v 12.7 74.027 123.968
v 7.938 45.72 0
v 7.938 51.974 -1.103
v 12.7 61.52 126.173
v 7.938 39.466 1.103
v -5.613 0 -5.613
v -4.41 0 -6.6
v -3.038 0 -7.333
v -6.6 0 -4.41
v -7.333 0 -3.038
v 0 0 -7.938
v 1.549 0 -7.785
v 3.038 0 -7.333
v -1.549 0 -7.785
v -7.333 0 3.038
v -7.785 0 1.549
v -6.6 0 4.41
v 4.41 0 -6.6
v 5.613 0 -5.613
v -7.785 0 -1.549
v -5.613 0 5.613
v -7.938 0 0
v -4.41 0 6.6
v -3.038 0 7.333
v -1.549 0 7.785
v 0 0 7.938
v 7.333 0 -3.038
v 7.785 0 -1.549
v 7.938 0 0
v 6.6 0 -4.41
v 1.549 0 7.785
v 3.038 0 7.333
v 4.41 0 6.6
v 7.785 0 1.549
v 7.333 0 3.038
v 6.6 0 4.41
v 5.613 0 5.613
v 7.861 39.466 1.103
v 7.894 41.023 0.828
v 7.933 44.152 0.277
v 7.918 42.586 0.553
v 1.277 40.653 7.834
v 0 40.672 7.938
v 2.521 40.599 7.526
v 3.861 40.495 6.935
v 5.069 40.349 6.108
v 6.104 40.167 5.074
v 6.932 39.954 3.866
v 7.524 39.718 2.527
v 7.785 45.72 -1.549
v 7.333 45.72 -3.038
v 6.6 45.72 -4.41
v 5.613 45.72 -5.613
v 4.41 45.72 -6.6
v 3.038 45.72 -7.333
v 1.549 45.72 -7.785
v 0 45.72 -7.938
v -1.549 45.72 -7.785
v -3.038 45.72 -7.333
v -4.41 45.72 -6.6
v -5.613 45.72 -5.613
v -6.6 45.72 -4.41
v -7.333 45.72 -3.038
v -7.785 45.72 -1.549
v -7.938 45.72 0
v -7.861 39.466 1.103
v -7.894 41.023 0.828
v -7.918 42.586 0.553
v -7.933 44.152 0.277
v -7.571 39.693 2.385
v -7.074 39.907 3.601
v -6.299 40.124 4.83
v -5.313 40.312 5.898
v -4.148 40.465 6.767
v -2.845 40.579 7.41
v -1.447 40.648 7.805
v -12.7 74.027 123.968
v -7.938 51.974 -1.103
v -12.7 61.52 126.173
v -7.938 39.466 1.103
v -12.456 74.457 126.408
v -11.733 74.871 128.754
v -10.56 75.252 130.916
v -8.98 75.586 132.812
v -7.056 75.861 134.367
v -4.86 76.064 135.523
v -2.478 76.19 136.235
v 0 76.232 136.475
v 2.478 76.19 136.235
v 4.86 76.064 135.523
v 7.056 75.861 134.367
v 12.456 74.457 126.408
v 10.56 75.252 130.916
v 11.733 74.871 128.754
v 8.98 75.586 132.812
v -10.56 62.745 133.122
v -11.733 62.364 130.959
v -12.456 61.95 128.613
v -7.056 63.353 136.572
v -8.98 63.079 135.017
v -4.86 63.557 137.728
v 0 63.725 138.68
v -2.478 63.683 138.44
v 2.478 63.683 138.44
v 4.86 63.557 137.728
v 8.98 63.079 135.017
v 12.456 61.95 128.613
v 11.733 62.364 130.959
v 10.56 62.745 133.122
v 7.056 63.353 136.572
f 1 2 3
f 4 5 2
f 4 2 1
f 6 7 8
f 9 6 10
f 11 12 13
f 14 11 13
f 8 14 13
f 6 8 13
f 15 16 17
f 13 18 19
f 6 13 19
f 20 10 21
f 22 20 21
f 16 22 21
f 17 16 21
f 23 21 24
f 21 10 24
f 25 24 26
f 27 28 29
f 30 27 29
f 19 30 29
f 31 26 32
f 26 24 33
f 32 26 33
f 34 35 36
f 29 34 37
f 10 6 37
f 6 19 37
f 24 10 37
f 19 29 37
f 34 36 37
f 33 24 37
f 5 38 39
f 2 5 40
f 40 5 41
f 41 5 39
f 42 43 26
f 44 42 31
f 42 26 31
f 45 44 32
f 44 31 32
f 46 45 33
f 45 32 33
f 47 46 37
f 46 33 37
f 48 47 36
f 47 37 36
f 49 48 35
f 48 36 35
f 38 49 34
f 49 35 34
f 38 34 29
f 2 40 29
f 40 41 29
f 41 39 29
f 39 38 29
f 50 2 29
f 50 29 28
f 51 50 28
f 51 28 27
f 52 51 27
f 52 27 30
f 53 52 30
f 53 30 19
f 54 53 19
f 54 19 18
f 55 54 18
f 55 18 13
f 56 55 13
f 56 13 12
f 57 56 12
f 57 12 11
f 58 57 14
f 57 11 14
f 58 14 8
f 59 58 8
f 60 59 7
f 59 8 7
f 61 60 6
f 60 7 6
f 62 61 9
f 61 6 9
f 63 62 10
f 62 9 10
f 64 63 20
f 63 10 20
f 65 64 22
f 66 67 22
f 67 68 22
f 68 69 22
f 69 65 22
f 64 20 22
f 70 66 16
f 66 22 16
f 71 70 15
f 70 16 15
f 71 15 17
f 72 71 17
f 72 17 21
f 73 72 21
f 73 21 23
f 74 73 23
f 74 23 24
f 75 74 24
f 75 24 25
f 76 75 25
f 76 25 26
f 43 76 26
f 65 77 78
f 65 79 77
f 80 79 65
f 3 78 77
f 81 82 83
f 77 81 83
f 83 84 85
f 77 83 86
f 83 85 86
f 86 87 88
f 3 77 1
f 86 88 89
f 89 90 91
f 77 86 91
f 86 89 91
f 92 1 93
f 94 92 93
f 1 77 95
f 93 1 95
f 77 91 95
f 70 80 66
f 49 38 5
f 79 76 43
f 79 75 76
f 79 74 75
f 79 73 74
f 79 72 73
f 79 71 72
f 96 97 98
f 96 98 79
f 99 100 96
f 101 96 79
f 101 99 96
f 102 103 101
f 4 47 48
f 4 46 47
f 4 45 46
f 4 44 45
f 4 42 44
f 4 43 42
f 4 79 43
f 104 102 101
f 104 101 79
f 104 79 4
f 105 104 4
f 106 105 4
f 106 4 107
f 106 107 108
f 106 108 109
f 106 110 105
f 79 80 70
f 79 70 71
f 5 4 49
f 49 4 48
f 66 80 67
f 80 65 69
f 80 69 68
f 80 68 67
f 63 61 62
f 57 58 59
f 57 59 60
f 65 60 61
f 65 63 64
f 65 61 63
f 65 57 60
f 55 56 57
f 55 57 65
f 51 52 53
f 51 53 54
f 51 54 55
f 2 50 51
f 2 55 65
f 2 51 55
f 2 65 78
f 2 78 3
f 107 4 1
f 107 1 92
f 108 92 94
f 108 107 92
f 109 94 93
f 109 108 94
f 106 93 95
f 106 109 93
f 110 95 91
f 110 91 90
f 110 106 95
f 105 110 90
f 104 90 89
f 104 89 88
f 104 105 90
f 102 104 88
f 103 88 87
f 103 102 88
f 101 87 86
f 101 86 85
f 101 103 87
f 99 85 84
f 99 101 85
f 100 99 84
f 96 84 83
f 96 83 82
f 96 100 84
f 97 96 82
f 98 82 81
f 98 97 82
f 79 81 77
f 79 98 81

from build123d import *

# Parameters (mm, degrees)
SKETCH1_R           = 7.9375
BOSS_EXTRUDE1_DEPTH = 45.72
BOSS_EXTRUDE2_DEPTH = 6.35


with BuildPart() as part:
    # Sketch1 → Boss-Extrude1 (new body)
    with BuildSketch(Plane(origin=(0, 0, 0), x_dir=(1, 0, 0), z_dir=(0, 1, 0))):
        Circle(SKETCH1_R)
    extrude(amount=BOSS_EXTRUDE1_DEPTH)

    # Sketch2 → Boss-Extrude2 (add, symmetric)
    with BuildSketch(Plane(origin=(0, 44.341373311, -7.818580476), x_dir=(1, 0, 0), z_dir=(0, -0.9848077530122086, 0.17364817766692736))):
        with BuildLine():
            Line((-7.9375, 7.939194683), (7.9375, 7.939194683))
            Line((7.9375, 7.939194683), (12.7, 134.939194683))
            ThreePointArc((12.7, 134.939194683), (0, 147.639194683), (-12.7, 134.939194683))
            Line((-12.7, 134.939194683), (-7.9375, 7.939194683))
        make_face()
    extrude(amount=BOSS_EXTRUDE2_DEPTH, both=True)


solid = part.part
